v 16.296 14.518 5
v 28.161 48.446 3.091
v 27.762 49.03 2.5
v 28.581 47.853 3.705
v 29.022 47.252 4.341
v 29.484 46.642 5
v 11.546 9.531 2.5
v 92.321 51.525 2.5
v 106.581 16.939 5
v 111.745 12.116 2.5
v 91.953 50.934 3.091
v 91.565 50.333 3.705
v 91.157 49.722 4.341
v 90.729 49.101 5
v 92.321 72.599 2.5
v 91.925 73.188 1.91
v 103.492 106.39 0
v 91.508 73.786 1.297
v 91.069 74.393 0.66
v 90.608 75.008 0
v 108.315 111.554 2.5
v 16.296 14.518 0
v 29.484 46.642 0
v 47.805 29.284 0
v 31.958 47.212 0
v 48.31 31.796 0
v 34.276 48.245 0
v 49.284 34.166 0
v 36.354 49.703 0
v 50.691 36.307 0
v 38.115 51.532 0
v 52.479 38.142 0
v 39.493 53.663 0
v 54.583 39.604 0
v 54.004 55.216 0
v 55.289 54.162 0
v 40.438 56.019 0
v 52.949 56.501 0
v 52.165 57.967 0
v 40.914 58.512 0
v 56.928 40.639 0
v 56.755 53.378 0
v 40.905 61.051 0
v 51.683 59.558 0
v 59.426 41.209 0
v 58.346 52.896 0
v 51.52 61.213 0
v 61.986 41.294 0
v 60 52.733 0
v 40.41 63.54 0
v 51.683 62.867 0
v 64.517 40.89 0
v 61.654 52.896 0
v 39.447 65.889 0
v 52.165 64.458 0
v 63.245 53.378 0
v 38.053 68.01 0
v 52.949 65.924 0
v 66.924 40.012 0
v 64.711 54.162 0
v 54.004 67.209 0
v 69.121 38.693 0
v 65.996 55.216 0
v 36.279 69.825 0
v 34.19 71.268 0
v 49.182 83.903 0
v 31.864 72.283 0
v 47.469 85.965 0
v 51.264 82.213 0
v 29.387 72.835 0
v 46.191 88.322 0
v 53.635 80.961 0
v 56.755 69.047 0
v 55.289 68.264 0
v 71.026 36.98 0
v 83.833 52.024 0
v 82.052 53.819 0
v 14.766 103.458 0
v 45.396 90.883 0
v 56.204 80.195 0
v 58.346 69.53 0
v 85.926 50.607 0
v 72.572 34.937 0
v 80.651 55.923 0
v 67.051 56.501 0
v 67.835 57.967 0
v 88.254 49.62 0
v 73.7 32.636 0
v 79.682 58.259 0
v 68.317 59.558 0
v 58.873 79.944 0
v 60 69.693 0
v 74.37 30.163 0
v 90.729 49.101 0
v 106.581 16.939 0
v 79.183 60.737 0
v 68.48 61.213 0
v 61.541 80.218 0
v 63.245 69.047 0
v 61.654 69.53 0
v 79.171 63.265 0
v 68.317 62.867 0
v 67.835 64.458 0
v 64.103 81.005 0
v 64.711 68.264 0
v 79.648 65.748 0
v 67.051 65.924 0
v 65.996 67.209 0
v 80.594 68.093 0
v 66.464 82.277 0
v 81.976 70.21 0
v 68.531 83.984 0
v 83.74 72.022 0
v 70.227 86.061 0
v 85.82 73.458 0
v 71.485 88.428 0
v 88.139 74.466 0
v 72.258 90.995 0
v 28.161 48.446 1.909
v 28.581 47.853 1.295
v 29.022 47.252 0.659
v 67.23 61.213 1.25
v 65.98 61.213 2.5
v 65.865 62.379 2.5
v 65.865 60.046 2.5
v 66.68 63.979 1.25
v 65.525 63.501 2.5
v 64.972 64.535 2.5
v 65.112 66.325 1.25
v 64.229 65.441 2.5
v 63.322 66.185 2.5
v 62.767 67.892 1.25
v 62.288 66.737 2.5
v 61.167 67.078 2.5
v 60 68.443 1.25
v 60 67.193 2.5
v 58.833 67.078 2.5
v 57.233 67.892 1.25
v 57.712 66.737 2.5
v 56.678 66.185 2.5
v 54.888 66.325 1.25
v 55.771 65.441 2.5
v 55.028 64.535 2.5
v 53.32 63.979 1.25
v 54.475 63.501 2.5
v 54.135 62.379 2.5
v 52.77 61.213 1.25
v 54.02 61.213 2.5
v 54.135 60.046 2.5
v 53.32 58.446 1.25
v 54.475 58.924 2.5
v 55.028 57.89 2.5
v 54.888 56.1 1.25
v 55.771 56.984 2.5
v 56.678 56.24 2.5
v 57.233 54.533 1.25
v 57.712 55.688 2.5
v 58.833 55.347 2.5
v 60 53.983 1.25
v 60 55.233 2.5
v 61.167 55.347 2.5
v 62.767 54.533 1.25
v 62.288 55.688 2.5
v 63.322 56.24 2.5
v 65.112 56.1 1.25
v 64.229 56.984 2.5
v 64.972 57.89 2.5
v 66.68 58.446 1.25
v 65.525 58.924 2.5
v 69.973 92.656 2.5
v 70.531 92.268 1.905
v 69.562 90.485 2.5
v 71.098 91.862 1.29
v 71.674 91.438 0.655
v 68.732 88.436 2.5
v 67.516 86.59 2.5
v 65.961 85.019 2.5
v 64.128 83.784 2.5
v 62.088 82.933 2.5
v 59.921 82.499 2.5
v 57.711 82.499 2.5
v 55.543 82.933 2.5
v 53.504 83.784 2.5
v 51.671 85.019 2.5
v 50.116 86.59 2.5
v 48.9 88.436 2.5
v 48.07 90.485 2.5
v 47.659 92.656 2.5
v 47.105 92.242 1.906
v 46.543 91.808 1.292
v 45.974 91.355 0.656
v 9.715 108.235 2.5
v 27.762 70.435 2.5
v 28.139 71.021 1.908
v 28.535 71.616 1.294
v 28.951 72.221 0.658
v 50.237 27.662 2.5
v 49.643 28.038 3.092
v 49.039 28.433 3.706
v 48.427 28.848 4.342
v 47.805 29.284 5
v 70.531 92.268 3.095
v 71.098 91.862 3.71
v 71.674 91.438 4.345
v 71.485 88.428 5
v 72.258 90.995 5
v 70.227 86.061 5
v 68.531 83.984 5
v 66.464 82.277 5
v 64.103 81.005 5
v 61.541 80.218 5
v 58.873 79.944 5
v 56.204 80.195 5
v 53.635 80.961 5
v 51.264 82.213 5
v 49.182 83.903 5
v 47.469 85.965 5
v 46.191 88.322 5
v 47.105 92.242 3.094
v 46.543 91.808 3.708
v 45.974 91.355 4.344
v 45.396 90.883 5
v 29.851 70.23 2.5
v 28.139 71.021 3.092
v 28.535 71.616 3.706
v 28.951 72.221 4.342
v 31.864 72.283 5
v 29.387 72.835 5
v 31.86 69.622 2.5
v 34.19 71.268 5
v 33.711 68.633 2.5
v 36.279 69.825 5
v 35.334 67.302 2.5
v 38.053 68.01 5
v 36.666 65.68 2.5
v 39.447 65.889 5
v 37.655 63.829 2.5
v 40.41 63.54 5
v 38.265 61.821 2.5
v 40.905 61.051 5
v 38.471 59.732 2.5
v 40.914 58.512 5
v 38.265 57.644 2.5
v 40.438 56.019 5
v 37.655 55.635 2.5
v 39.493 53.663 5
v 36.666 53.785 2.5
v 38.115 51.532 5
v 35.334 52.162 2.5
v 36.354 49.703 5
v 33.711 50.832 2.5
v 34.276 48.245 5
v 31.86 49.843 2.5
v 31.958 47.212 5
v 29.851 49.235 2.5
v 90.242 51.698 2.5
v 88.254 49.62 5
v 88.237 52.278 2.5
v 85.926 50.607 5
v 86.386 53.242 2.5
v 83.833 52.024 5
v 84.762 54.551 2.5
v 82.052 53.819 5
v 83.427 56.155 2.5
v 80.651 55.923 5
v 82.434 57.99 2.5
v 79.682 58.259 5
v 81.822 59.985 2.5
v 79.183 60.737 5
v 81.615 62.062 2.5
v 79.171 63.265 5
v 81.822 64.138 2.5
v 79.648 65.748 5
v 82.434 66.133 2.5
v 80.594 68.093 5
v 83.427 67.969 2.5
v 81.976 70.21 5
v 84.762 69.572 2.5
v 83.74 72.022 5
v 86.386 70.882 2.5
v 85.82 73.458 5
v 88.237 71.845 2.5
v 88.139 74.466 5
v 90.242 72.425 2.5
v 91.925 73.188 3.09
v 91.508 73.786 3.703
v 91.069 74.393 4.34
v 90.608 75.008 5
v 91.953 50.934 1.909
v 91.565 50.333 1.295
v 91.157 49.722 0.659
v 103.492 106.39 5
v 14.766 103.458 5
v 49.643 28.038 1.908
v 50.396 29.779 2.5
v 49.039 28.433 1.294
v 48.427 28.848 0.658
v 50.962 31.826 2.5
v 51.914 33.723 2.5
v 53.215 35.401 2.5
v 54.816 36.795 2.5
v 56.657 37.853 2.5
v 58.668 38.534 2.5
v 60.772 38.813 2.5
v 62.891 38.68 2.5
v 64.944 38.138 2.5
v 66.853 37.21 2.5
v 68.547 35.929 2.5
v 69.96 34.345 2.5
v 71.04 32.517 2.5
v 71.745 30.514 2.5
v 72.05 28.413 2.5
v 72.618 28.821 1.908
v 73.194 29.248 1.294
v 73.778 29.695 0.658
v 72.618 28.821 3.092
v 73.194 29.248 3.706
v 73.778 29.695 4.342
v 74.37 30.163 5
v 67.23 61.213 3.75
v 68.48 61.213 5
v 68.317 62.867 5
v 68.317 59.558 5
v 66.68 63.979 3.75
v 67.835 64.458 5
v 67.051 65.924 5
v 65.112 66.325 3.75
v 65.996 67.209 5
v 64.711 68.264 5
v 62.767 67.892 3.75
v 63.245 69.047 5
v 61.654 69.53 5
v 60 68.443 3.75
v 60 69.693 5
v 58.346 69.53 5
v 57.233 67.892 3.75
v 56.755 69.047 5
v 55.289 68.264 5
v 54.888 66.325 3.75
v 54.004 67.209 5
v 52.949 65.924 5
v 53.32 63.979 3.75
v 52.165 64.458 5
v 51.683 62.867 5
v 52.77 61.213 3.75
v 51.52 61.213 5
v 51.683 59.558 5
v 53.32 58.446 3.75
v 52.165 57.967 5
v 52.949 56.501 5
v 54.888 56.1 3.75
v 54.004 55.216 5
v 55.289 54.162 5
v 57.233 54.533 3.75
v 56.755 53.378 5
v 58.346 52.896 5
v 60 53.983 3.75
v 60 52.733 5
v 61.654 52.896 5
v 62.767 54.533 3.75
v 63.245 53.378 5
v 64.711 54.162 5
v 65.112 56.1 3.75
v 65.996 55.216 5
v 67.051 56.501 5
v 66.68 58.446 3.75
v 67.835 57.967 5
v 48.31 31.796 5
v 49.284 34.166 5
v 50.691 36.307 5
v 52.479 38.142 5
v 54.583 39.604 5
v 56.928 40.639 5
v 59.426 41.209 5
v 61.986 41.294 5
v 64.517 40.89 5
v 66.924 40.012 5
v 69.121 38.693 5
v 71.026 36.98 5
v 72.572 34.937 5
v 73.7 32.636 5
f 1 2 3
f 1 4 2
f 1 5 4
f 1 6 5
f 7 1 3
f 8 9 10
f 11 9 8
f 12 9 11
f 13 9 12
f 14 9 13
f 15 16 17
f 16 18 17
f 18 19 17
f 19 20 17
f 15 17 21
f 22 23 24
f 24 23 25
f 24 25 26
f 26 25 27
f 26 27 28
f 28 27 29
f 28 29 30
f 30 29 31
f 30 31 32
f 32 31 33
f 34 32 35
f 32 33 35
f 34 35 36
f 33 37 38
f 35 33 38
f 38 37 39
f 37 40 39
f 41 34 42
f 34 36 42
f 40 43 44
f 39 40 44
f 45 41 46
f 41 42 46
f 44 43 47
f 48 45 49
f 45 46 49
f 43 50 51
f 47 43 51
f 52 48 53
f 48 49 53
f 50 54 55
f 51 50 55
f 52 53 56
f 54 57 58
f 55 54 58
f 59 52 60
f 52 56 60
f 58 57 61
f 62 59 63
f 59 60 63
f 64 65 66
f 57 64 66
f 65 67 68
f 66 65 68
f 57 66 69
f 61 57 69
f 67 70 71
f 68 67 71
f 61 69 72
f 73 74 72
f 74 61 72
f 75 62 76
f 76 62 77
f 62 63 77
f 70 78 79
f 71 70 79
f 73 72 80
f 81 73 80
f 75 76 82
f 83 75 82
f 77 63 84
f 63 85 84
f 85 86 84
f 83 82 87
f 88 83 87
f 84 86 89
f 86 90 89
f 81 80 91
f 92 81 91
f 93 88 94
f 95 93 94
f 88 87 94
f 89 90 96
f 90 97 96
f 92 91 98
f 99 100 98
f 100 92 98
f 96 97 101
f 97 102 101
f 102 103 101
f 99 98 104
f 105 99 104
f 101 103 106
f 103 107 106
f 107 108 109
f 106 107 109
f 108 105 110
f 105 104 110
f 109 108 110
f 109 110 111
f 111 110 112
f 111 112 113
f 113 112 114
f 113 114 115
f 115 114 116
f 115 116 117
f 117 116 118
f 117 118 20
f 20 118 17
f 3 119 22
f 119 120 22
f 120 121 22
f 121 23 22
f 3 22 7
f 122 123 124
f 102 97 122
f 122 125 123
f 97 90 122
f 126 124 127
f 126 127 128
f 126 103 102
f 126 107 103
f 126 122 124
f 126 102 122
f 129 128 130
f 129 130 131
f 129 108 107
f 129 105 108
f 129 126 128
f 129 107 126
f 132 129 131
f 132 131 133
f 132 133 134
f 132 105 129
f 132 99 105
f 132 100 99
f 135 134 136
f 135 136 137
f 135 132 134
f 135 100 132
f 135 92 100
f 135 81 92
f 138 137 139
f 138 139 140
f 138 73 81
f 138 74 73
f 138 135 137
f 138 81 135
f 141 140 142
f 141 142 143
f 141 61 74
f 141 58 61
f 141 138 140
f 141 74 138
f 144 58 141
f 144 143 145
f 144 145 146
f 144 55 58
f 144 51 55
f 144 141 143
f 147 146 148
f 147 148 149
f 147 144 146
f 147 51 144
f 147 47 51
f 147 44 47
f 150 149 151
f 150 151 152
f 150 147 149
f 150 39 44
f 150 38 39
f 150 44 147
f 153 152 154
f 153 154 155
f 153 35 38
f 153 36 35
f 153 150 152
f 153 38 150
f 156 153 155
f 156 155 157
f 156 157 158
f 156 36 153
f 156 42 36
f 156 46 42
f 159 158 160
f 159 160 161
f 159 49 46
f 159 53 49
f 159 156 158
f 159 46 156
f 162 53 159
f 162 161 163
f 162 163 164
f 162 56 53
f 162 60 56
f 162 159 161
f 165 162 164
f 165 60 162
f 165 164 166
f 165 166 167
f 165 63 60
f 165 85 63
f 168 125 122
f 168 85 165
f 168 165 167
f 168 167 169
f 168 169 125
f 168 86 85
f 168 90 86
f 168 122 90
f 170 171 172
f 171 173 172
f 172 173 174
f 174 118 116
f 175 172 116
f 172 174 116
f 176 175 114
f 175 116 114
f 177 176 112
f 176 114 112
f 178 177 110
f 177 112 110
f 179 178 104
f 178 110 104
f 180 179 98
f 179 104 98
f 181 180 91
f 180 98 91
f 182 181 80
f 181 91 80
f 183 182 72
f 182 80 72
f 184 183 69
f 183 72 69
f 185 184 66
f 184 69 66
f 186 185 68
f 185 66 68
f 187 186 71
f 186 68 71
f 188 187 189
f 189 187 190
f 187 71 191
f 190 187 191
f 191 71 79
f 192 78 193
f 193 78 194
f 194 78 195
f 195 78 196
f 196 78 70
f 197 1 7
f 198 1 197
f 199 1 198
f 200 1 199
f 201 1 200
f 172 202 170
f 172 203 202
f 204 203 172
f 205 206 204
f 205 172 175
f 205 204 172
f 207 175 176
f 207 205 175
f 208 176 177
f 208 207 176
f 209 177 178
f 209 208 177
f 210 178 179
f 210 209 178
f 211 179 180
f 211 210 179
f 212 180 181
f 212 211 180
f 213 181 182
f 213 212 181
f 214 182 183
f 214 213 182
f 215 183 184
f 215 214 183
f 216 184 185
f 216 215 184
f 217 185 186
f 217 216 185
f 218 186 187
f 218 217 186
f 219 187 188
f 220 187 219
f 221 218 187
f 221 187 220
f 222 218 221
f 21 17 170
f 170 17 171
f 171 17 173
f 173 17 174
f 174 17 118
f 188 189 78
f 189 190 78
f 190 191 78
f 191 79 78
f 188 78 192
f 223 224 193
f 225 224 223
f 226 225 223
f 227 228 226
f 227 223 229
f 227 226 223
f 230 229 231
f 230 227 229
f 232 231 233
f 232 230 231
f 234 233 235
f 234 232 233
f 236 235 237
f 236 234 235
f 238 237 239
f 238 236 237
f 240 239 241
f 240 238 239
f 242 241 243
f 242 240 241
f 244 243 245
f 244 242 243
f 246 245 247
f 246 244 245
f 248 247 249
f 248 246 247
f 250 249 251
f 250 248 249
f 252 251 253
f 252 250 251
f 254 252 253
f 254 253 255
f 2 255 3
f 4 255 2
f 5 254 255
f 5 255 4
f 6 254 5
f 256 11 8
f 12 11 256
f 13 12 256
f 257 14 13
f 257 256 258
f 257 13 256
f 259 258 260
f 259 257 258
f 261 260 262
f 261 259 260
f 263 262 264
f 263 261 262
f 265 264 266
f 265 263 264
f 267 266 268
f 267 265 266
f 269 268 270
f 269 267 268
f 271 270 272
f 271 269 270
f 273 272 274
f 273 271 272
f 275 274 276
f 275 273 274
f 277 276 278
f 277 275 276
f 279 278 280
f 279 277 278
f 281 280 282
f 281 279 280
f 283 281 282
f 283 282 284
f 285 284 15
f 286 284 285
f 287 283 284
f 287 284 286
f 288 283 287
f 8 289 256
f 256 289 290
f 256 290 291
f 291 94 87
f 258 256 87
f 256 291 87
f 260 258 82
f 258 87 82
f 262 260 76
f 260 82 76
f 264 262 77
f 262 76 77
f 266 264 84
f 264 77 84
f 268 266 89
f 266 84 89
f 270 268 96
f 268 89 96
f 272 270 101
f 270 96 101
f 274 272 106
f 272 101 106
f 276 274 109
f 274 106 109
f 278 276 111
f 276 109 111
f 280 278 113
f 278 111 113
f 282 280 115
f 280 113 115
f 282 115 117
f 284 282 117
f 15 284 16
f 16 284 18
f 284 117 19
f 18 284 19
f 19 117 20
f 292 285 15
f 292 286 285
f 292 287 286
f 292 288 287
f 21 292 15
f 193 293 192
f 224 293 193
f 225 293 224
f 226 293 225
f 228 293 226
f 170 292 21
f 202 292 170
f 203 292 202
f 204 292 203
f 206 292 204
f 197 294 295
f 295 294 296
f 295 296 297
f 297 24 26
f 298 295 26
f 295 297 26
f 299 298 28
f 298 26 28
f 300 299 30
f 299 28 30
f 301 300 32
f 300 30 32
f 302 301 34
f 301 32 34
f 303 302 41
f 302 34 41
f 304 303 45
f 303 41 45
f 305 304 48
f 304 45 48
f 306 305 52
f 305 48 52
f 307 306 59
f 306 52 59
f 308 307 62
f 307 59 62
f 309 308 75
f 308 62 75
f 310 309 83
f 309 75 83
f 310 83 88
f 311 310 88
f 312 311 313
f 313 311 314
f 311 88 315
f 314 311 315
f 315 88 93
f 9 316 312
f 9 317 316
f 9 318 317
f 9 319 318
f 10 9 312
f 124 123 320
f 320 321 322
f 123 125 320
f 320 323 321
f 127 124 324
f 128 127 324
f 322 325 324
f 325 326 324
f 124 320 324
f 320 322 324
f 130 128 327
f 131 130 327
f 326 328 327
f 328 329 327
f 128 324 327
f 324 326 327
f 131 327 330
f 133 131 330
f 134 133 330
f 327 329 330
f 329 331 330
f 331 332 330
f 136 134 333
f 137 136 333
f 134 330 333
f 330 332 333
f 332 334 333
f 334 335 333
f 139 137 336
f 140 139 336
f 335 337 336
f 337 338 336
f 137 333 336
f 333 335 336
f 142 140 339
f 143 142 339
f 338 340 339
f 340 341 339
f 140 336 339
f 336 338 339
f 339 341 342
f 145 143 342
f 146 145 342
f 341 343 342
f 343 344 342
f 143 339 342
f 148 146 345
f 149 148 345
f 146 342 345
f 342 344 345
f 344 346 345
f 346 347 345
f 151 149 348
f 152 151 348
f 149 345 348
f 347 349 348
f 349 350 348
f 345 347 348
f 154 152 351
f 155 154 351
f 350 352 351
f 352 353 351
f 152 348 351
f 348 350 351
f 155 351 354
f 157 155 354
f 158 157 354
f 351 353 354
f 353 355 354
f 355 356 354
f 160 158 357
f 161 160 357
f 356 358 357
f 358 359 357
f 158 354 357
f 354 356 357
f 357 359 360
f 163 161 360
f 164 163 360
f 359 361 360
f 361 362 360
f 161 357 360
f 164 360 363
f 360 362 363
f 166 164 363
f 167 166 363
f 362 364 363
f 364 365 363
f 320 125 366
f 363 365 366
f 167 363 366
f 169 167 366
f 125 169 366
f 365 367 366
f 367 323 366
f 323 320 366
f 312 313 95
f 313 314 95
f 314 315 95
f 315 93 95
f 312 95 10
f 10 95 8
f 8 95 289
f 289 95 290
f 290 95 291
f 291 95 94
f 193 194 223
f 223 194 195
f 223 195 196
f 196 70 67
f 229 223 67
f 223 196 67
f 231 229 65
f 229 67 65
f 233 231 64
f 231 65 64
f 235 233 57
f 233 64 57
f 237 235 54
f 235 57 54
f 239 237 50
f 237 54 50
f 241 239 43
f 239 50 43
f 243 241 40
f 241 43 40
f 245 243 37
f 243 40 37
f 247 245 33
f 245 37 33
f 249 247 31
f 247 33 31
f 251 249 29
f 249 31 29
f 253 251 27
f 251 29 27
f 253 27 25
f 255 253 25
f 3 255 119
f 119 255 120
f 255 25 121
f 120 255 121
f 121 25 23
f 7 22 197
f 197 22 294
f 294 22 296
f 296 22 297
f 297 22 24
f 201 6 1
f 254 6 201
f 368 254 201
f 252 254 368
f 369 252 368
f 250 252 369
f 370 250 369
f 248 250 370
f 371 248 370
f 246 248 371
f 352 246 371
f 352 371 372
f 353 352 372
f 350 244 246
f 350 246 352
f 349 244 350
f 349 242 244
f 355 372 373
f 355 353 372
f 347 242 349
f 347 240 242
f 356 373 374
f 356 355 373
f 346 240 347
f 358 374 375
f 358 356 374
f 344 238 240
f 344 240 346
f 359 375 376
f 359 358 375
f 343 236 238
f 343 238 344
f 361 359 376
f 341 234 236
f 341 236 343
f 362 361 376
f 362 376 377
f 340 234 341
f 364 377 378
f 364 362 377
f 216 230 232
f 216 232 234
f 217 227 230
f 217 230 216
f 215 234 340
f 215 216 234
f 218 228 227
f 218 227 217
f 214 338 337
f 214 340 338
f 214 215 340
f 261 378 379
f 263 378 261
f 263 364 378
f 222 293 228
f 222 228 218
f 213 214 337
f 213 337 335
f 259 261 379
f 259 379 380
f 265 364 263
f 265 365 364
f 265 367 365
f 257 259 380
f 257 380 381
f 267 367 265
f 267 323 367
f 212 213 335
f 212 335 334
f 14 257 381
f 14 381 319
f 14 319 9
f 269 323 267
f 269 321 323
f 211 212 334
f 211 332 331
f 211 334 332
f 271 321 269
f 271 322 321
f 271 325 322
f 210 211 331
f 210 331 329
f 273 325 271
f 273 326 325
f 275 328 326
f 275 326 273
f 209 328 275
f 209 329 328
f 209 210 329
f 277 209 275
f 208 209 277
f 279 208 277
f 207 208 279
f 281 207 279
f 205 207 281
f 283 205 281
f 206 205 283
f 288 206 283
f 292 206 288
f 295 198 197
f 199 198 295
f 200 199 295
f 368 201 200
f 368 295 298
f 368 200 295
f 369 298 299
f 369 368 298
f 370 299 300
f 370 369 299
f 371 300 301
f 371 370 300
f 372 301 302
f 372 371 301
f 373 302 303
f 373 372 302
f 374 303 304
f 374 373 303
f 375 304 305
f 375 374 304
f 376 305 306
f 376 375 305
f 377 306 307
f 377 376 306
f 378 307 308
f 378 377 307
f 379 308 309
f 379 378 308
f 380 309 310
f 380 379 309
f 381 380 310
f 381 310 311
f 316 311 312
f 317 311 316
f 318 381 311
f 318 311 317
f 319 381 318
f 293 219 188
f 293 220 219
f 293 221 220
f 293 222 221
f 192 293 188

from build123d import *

# Parameters (mm, degrees)
F0_R     = 5.9800521353
F1_DEPTH = 5
F2_SIZE  = 2.49999


# Not quite as in the source:
# - a fillet or chamfer is up to 0.001 mm smaller than in the source, because OpenCascade refuses the exact size


with BuildPart() as f1:
    # F0 (on Top) → F1 (new body)
    with BuildSketch(Plane.XY):
        with BuildLine():
            Line((27.7623478323, 49.0298643708), (11.5457307547, 9.5314830542))
            Line((11.5457307547, 9.5314830542), (50.2365343273, 27.6623163372))
            ThreePointArc((50.2365343273, 27.6623163372), (60.7722385086, 38.8133091708), (72.0498927169, 28.4132986261))
            Line((72.0498927169, 28.4132986261), (111.7447488987, 12.1160160238))
            Line((111.7447488987, 12.1160160238), (92.3213660153, 51.5245050192))
            ThreePointArc((92.3213660153, 51.5245050192), (81.6154488918, 62.0616839697), (92.3213660153, 72.5988629201))
            Line((92.3213660153, 72.5988629201), (108.314871788, 111.5538179874))
            Line((108.314871788, 111.5538179874), (69.9733346701, 92.6563069494))
            ThreePointArc((69.9733346701, 92.6563069494), (58.8159662766, 82.4438797358), (47.6585978831, 92.6563069494))
            Line((47.6585978831, 92.6563069494), (9.7151305526, 108.2345321774))
            Line((9.7151305526, 108.2345321774), (27.7623478323, 70.4347789288))
            ThreePointArc((27.7623478323, 70.4347789288), (38.47065847, 59.7323216498), (27.7623478323, 49.0298643708))
        make_face()
        with Locations((60, 61.2126085907)):
            Circle(F0_R, mode=Mode.SUBTRACT)
    extrude(amount=F1_DEPTH)

    # F2 (size 2.5 in the source; OpenCascade refuses exactly that, so slightly less here)
    f2_edges = [f1.edges().sort_by_distance(p)[0] for p in [
        (28.686864, 100.44542, 5),
        (18.738739, 89.334656, 5),
        (38.470658, 59.732322, 5),
        (19.654039, 29.280674, 5),
        (30.891133, 18.5969, 5),
        (60.772239, 38.813309, 5),
        (91.897321, 20.264657, 5),
        (102.033057, 31.820261, 5),
        (81.615449, 62.061684, 5),
        (100.318119, 92.07634, 5),
        (89.144103, 102.105062, 5),
        (58.815966, 82.44388, 5),
        (54.019948, 61.212609, 5),
        (28.686864, 100.44542, 0),
        (18.738739, 89.334656, 0),
        (38.470658, 59.732322, 0),
        (19.654039, 29.280674, 0),
        (30.891133, 18.5969, 0),
        (60.772239, 38.813309, 0),
        (91.897321, 20.264657, 0),
        (102.033057, 31.820261, 0),
        (81.615449, 62.061684, 0),
        (100.318119, 92.07634, 0),
        (89.144103, 102.105062, 0),
        (58.815966, 82.44388, 0),
        (54.019948, 61.212609, 0),
    ]]
    chamfer(f2_edges, length=F2_SIZE)


solid = f1.part
